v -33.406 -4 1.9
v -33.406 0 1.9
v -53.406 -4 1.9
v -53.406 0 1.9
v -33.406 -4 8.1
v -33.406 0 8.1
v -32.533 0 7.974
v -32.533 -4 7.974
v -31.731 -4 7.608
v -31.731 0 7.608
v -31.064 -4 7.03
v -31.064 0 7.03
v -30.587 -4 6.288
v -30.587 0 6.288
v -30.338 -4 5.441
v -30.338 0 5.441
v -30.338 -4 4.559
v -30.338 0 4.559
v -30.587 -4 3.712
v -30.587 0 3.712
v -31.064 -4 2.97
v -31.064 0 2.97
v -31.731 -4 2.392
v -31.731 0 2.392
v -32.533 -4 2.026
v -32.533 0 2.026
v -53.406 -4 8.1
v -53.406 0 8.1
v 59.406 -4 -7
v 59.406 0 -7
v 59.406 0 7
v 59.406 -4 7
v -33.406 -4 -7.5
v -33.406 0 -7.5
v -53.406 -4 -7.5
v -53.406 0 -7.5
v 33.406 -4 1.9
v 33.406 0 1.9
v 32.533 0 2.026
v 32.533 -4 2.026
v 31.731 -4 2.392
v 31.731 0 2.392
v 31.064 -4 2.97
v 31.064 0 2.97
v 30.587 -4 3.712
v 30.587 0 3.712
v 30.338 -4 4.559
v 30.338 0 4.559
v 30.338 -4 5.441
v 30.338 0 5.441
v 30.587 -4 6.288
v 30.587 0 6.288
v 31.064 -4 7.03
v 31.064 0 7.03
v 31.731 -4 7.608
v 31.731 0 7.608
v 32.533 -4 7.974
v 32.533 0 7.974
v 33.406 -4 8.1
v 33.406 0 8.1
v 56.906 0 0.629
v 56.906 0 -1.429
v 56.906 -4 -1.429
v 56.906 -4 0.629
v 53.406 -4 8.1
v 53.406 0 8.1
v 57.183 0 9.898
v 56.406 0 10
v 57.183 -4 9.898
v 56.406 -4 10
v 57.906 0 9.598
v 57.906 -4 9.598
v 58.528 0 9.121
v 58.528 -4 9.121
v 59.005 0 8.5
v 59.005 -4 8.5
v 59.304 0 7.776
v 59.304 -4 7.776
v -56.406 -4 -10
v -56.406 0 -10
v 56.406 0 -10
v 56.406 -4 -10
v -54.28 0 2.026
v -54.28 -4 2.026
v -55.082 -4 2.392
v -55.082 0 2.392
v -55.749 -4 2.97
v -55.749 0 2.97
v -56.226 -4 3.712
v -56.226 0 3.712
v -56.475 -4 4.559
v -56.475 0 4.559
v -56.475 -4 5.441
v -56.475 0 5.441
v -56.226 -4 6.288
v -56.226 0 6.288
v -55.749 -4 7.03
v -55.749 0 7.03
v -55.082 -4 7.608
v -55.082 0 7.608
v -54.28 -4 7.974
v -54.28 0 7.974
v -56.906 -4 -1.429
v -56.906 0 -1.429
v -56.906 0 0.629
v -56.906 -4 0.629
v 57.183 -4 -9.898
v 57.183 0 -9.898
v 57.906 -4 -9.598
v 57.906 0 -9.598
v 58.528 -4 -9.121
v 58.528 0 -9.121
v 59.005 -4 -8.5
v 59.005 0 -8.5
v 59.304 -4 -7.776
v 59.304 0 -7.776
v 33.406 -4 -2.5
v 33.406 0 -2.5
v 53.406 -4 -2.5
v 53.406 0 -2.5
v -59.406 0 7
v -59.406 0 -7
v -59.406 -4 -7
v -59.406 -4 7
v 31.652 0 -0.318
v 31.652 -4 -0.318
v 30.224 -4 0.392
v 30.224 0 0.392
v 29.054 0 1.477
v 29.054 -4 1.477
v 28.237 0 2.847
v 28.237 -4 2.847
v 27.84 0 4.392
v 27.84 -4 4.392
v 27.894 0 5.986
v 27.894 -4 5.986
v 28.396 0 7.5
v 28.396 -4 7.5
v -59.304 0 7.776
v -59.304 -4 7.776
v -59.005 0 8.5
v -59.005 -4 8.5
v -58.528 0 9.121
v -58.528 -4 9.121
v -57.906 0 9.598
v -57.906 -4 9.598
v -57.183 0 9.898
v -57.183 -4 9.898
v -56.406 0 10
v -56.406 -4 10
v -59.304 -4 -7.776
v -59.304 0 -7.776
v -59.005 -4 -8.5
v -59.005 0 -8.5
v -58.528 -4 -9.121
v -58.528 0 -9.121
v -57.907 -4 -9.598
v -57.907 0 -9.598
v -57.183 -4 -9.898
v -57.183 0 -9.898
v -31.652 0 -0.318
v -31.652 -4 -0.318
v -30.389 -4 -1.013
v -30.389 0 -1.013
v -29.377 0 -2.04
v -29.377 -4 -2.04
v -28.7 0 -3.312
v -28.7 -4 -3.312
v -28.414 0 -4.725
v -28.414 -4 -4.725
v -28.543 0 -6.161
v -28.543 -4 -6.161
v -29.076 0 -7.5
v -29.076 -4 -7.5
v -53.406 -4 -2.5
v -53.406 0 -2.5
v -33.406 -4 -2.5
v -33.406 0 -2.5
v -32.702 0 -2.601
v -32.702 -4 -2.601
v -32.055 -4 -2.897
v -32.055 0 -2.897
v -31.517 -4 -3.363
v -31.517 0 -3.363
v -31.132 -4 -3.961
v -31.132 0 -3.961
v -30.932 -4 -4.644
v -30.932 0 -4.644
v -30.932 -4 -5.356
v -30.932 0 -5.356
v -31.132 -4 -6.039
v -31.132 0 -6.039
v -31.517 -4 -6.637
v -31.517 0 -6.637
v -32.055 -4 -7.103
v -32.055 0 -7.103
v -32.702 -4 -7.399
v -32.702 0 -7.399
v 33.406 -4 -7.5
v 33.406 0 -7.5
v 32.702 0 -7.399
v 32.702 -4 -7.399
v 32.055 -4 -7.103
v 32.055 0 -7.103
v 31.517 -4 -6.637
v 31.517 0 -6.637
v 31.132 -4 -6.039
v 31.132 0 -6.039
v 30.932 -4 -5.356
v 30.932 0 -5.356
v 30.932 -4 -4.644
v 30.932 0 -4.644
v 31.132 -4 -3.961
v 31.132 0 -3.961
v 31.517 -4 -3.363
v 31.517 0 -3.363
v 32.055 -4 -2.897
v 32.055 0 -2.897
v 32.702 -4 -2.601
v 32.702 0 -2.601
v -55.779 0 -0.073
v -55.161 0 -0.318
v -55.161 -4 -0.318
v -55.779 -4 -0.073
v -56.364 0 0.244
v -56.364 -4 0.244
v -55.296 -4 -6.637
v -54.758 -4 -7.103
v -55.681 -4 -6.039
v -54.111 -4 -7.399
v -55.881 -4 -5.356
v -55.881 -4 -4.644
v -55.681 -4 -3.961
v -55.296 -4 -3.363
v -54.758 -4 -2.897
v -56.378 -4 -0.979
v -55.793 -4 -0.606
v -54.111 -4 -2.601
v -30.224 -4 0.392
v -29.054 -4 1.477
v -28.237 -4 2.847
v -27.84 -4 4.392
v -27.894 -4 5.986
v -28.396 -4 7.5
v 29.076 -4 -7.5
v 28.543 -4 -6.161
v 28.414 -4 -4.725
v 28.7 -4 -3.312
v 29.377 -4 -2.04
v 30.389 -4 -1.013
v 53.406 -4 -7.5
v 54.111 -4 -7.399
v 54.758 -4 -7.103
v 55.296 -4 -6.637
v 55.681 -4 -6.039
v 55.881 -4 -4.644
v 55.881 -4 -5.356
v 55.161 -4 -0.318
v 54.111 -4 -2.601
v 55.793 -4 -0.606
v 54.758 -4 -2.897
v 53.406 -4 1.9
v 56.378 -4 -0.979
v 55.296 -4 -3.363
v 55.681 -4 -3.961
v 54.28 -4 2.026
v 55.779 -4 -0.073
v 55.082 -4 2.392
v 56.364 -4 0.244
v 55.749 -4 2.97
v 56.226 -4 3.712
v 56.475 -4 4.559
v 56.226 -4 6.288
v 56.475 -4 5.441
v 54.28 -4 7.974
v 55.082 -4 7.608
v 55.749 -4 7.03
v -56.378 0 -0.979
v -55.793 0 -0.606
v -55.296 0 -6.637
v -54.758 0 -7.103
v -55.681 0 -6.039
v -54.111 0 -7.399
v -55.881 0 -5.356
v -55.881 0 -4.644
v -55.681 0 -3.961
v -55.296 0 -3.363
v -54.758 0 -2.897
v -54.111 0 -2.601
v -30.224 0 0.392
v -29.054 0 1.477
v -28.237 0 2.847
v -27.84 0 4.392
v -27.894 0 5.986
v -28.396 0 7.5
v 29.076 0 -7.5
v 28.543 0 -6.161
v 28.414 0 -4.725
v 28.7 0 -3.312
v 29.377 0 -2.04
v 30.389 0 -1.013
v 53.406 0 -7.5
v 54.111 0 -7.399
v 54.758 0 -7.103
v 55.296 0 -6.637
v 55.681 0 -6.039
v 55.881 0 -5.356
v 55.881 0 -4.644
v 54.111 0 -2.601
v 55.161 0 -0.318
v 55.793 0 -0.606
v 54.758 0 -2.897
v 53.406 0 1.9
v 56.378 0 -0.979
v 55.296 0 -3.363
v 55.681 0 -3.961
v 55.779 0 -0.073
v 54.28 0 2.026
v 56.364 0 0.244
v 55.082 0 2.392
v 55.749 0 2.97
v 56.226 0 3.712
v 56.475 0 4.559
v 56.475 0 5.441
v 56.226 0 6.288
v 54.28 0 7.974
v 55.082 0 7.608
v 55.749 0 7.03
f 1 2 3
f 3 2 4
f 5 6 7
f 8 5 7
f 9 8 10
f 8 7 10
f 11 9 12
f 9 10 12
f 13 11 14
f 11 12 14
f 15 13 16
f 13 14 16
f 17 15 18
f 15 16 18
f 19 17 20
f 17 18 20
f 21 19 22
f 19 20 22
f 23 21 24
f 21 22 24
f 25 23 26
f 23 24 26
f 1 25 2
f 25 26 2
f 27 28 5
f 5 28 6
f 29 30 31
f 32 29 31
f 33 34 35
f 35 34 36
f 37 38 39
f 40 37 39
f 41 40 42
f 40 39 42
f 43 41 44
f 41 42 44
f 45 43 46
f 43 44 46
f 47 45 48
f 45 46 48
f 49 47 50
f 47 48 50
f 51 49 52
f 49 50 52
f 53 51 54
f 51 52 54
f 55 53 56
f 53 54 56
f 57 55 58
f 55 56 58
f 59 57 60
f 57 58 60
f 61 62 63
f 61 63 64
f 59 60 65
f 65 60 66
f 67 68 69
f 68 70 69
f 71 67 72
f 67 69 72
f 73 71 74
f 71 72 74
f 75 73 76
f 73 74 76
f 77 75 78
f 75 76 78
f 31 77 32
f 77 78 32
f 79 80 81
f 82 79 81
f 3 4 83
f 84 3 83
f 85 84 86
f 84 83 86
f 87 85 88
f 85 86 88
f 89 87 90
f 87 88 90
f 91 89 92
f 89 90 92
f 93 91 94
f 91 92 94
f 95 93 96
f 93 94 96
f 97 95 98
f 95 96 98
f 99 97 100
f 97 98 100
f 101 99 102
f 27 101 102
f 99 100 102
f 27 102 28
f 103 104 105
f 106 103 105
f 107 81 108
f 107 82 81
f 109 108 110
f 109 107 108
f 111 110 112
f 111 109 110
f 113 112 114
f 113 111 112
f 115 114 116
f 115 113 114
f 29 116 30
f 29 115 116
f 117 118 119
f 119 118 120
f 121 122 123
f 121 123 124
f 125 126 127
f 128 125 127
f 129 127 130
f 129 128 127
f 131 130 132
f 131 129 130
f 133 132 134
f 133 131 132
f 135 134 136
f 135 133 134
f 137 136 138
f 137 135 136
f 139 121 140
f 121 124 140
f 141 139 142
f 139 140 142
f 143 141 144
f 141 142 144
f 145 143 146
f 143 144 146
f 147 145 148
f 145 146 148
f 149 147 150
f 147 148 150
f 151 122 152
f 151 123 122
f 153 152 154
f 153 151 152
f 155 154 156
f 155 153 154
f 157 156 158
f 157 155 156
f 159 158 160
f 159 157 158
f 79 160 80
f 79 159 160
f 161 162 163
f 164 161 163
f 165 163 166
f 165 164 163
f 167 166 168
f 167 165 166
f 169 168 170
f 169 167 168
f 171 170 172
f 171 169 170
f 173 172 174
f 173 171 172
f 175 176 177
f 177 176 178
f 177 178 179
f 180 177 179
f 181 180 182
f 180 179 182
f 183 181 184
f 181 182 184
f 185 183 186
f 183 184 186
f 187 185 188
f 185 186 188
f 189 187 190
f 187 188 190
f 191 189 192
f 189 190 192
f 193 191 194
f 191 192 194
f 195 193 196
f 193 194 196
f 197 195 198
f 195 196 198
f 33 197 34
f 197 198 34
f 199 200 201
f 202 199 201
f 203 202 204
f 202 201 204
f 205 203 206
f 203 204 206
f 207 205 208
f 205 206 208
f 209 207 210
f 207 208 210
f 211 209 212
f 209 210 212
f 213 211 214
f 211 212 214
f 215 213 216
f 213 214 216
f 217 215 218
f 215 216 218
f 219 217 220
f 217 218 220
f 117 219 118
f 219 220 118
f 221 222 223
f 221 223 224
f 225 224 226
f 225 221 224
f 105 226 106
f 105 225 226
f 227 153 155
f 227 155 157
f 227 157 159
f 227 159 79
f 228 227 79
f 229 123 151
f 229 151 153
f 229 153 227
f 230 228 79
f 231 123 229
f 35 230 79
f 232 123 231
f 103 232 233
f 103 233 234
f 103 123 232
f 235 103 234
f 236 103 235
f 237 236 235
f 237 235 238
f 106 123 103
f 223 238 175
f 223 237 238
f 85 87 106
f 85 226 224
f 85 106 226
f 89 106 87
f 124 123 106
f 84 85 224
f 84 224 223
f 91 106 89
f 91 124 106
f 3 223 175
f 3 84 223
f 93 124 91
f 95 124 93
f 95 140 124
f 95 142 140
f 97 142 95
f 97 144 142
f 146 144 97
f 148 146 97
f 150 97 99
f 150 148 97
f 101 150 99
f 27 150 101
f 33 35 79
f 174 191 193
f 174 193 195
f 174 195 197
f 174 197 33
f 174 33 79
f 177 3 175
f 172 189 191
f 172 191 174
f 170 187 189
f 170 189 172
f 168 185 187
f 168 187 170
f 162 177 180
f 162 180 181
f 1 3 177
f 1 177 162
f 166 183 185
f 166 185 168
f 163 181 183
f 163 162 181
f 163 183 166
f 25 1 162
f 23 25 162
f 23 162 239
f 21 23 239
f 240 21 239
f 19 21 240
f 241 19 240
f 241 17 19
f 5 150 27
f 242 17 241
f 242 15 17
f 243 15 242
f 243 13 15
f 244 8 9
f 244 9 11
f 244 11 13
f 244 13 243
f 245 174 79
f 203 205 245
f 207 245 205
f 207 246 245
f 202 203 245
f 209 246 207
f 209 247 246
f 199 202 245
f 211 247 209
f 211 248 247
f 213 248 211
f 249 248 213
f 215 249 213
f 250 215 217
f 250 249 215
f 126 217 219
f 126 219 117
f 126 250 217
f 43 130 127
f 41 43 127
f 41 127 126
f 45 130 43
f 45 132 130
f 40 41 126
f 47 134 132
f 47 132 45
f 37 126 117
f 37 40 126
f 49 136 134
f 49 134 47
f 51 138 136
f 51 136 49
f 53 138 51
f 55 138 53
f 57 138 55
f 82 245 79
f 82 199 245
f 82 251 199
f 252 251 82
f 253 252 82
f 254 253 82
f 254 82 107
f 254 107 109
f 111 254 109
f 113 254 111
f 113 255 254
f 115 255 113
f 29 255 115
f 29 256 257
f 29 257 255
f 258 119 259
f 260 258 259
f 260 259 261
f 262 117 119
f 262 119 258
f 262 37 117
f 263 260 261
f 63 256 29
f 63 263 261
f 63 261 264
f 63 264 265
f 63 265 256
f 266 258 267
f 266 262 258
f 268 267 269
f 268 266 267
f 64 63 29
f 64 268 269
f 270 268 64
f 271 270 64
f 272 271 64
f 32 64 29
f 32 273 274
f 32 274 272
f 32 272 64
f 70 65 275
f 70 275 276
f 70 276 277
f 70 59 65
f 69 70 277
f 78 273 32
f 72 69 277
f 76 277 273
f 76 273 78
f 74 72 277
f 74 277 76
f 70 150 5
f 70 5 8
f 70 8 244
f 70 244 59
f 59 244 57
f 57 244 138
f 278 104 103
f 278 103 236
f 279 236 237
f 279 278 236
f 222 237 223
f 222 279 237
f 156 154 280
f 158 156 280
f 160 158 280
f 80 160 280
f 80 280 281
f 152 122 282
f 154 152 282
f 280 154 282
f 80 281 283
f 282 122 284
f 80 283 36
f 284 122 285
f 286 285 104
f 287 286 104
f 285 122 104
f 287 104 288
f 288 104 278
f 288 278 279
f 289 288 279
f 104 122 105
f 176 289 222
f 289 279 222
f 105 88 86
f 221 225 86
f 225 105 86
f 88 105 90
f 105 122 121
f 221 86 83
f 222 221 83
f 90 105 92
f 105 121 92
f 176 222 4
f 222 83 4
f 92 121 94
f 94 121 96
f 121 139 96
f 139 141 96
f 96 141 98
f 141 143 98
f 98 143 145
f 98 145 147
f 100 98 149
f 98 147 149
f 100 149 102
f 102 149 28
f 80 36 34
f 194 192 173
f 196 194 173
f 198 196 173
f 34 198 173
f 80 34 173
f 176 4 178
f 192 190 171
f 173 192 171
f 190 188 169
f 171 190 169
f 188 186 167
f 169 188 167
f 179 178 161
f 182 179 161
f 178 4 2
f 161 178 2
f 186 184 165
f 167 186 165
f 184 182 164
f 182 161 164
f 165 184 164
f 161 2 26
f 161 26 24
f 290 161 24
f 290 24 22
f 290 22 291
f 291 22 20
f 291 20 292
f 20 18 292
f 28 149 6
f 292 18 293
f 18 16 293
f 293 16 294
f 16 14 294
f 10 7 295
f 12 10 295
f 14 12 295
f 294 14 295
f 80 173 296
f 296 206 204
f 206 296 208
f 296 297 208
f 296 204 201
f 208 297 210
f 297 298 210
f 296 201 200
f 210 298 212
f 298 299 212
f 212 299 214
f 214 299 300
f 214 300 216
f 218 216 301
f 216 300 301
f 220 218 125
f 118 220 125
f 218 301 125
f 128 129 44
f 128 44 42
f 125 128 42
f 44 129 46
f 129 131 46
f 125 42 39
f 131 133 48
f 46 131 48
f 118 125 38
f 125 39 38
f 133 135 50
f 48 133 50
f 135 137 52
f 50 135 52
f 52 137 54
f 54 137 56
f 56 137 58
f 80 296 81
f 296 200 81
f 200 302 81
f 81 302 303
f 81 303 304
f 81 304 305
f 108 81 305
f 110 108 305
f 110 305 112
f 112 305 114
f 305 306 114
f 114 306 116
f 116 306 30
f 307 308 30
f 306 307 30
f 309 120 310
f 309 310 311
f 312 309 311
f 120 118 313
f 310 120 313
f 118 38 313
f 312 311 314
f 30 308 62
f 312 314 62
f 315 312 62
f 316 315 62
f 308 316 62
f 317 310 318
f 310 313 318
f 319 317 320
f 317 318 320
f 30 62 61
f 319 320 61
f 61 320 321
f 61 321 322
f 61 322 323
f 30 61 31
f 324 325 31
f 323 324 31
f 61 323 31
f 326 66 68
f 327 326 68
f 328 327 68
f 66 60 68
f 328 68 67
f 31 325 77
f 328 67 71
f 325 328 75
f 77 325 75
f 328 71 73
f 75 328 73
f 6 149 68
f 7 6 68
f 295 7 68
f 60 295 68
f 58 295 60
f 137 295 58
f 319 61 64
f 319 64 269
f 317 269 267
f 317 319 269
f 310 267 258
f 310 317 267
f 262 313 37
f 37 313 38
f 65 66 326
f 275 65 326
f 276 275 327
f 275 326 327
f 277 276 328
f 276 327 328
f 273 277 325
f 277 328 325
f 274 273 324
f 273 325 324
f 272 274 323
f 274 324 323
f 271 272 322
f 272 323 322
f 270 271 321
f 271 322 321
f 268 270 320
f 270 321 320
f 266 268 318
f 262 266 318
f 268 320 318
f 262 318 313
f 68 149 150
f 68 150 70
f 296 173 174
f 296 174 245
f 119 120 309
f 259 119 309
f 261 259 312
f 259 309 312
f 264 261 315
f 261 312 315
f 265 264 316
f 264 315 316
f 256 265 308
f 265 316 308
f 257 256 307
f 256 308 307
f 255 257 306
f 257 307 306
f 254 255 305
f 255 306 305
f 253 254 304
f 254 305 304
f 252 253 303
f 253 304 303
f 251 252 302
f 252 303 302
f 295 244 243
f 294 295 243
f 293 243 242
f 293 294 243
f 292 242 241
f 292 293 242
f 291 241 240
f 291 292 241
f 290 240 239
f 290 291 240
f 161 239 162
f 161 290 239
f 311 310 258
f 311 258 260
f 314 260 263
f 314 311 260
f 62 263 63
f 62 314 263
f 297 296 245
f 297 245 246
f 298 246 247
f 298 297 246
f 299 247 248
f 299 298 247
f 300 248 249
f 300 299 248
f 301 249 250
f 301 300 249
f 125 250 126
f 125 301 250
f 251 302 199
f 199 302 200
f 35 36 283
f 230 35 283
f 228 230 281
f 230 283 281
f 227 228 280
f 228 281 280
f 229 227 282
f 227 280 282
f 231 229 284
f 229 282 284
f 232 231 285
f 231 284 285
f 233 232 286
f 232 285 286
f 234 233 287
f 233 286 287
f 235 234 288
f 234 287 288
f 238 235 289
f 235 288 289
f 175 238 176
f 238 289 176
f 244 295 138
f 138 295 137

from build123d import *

# Parameters (mm, degrees)
F0_W     = 118.813
F0_H     = 20
F1_DEPTH = 4
F2_T     = 2.5
F3_R     = 3


# Not quite as in the source:
# - a shell that OpenCascade refuses in one call is made with other operations: the cavity is built on its own and cut out


with BuildPart() as f1:
    # F0 (on Front) → F1 (new body)
    with BuildSketch(Plane.XZ):
        Rectangle(F0_W, F0_H)
        with BuildLine():
            Line((-33.4065, -7.5), (-53.4065, -7.5))
            ThreePointArc((-53.4065, -7.5), (-55.9065, -5), (-53.4065, -2.5))
            Line((-53.4065, -2.5), (-33.4065, -2.5))
            ThreePointArc((-33.4065, -2.5), (-30.9065, -5), (-33.4065, -7.5))
        make_face(mode=Mode.SUBTRACT)
        with BuildLine():
            Line((53.4065, -7.5), (33.4065, -7.5))
            ThreePointArc((33.4065, -7.5), (30.9065, -5), (33.4065, -2.5))
            Line((33.4065, -2.5), (53.4065, -2.5))
            ThreePointArc((53.4065, -2.5), (55.9065, -5), (53.4065, -7.5))
        make_face(mode=Mode.SUBTRACT)
        with BuildLine():
            Line((-33.4065, 1.9), (-53.4065, 1.9))
            ThreePointArc((-53.4065, 1.9), (-56.5065, 5), (-53.4065, 8.1))
            Line((-53.4065, 8.1), (-33.4065, 8.1))
            ThreePointArc((-33.4065, 8.1), (-30.3065, 5), (-33.4065, 1.9))
        make_face(mode=Mode.SUBTRACT)
        with BuildLine():
            Line((53.4065, 1.9), (33.4065, 1.9))
            ThreePointArc((33.4065, 1.9), (30.3065, 5), (33.4065, 8.1))
            Line((33.4065, 8.1), (53.4065, 8.1))
            ThreePointArc((53.4065, 8.1), (56.5065, 5), (53.4065, 1.9))
        make_face(mode=Mode.SUBTRACT)
    extrude(amount=F1_DEPTH)

    # F2: shell of thickness 2.5, made by hand


with BuildPart() as f2_core1:
    # F2_t2: copy of F1
    add(f1.part)

    # the walls: a layer under each face that stays
    f2_faces = [f2_core1.faces().sort_by_distance(p)[0] for p in [
        (59.4065, -2, 0),
        (0, -2, 10),
        (-59.4065, -2, 0),
        (0, -2, -10),
        (-43.4065, -2, -7.5),
        (-55.9065, -2, -5),
        (-43.4065, -2, -2.5),
        (-30.9065, -2, -5),
        (43.4065, -2, -7.5),
        (30.9065, -2, -5),
        (43.4065, -2, -2.5),
        (55.9065, -2, -5),
        (-43.4065, -2, 8.1),
        (-30.3065, -2, 5),
        (-43.4065, -2, 1.9),
        (-56.5065, -2, 5),
        (43.4065, -2, 1.9),
        (30.3065, -2, 5),
        (43.4065, -2, 8.1),
        (56.5065, -2, 5),
    ]]
    thicken(f2_faces, amount=-F2_T, mode=Mode.SUBTRACT)


with BuildPart() as f1_1:
    add(f1.part)

    # what is left inside the walls is the cavity
    f2_cavity = [f2_core1.part.solids().sort_by_distance(p)[0] for p in [
        (56.105376, -2.666667, -0.761286),
        (0, -0.025, -2.5),
        (-56.105376, -2.666667, -0.761286),
    ]]
    add(f2_cavity, mode=Mode.SUBTRACT)

    # F3
    f3_edges = [f1_1.edges().sort_by_distance(p)[0] for p in [
        (59.4065, -2, -10),
        (59.4065, -2, 10),
        (-59.4065, -2, -10),
        (-59.4065, -2, 10),
    ]]
    fillet(f3_edges, radius=F3_R)


solid = f1_1.part
